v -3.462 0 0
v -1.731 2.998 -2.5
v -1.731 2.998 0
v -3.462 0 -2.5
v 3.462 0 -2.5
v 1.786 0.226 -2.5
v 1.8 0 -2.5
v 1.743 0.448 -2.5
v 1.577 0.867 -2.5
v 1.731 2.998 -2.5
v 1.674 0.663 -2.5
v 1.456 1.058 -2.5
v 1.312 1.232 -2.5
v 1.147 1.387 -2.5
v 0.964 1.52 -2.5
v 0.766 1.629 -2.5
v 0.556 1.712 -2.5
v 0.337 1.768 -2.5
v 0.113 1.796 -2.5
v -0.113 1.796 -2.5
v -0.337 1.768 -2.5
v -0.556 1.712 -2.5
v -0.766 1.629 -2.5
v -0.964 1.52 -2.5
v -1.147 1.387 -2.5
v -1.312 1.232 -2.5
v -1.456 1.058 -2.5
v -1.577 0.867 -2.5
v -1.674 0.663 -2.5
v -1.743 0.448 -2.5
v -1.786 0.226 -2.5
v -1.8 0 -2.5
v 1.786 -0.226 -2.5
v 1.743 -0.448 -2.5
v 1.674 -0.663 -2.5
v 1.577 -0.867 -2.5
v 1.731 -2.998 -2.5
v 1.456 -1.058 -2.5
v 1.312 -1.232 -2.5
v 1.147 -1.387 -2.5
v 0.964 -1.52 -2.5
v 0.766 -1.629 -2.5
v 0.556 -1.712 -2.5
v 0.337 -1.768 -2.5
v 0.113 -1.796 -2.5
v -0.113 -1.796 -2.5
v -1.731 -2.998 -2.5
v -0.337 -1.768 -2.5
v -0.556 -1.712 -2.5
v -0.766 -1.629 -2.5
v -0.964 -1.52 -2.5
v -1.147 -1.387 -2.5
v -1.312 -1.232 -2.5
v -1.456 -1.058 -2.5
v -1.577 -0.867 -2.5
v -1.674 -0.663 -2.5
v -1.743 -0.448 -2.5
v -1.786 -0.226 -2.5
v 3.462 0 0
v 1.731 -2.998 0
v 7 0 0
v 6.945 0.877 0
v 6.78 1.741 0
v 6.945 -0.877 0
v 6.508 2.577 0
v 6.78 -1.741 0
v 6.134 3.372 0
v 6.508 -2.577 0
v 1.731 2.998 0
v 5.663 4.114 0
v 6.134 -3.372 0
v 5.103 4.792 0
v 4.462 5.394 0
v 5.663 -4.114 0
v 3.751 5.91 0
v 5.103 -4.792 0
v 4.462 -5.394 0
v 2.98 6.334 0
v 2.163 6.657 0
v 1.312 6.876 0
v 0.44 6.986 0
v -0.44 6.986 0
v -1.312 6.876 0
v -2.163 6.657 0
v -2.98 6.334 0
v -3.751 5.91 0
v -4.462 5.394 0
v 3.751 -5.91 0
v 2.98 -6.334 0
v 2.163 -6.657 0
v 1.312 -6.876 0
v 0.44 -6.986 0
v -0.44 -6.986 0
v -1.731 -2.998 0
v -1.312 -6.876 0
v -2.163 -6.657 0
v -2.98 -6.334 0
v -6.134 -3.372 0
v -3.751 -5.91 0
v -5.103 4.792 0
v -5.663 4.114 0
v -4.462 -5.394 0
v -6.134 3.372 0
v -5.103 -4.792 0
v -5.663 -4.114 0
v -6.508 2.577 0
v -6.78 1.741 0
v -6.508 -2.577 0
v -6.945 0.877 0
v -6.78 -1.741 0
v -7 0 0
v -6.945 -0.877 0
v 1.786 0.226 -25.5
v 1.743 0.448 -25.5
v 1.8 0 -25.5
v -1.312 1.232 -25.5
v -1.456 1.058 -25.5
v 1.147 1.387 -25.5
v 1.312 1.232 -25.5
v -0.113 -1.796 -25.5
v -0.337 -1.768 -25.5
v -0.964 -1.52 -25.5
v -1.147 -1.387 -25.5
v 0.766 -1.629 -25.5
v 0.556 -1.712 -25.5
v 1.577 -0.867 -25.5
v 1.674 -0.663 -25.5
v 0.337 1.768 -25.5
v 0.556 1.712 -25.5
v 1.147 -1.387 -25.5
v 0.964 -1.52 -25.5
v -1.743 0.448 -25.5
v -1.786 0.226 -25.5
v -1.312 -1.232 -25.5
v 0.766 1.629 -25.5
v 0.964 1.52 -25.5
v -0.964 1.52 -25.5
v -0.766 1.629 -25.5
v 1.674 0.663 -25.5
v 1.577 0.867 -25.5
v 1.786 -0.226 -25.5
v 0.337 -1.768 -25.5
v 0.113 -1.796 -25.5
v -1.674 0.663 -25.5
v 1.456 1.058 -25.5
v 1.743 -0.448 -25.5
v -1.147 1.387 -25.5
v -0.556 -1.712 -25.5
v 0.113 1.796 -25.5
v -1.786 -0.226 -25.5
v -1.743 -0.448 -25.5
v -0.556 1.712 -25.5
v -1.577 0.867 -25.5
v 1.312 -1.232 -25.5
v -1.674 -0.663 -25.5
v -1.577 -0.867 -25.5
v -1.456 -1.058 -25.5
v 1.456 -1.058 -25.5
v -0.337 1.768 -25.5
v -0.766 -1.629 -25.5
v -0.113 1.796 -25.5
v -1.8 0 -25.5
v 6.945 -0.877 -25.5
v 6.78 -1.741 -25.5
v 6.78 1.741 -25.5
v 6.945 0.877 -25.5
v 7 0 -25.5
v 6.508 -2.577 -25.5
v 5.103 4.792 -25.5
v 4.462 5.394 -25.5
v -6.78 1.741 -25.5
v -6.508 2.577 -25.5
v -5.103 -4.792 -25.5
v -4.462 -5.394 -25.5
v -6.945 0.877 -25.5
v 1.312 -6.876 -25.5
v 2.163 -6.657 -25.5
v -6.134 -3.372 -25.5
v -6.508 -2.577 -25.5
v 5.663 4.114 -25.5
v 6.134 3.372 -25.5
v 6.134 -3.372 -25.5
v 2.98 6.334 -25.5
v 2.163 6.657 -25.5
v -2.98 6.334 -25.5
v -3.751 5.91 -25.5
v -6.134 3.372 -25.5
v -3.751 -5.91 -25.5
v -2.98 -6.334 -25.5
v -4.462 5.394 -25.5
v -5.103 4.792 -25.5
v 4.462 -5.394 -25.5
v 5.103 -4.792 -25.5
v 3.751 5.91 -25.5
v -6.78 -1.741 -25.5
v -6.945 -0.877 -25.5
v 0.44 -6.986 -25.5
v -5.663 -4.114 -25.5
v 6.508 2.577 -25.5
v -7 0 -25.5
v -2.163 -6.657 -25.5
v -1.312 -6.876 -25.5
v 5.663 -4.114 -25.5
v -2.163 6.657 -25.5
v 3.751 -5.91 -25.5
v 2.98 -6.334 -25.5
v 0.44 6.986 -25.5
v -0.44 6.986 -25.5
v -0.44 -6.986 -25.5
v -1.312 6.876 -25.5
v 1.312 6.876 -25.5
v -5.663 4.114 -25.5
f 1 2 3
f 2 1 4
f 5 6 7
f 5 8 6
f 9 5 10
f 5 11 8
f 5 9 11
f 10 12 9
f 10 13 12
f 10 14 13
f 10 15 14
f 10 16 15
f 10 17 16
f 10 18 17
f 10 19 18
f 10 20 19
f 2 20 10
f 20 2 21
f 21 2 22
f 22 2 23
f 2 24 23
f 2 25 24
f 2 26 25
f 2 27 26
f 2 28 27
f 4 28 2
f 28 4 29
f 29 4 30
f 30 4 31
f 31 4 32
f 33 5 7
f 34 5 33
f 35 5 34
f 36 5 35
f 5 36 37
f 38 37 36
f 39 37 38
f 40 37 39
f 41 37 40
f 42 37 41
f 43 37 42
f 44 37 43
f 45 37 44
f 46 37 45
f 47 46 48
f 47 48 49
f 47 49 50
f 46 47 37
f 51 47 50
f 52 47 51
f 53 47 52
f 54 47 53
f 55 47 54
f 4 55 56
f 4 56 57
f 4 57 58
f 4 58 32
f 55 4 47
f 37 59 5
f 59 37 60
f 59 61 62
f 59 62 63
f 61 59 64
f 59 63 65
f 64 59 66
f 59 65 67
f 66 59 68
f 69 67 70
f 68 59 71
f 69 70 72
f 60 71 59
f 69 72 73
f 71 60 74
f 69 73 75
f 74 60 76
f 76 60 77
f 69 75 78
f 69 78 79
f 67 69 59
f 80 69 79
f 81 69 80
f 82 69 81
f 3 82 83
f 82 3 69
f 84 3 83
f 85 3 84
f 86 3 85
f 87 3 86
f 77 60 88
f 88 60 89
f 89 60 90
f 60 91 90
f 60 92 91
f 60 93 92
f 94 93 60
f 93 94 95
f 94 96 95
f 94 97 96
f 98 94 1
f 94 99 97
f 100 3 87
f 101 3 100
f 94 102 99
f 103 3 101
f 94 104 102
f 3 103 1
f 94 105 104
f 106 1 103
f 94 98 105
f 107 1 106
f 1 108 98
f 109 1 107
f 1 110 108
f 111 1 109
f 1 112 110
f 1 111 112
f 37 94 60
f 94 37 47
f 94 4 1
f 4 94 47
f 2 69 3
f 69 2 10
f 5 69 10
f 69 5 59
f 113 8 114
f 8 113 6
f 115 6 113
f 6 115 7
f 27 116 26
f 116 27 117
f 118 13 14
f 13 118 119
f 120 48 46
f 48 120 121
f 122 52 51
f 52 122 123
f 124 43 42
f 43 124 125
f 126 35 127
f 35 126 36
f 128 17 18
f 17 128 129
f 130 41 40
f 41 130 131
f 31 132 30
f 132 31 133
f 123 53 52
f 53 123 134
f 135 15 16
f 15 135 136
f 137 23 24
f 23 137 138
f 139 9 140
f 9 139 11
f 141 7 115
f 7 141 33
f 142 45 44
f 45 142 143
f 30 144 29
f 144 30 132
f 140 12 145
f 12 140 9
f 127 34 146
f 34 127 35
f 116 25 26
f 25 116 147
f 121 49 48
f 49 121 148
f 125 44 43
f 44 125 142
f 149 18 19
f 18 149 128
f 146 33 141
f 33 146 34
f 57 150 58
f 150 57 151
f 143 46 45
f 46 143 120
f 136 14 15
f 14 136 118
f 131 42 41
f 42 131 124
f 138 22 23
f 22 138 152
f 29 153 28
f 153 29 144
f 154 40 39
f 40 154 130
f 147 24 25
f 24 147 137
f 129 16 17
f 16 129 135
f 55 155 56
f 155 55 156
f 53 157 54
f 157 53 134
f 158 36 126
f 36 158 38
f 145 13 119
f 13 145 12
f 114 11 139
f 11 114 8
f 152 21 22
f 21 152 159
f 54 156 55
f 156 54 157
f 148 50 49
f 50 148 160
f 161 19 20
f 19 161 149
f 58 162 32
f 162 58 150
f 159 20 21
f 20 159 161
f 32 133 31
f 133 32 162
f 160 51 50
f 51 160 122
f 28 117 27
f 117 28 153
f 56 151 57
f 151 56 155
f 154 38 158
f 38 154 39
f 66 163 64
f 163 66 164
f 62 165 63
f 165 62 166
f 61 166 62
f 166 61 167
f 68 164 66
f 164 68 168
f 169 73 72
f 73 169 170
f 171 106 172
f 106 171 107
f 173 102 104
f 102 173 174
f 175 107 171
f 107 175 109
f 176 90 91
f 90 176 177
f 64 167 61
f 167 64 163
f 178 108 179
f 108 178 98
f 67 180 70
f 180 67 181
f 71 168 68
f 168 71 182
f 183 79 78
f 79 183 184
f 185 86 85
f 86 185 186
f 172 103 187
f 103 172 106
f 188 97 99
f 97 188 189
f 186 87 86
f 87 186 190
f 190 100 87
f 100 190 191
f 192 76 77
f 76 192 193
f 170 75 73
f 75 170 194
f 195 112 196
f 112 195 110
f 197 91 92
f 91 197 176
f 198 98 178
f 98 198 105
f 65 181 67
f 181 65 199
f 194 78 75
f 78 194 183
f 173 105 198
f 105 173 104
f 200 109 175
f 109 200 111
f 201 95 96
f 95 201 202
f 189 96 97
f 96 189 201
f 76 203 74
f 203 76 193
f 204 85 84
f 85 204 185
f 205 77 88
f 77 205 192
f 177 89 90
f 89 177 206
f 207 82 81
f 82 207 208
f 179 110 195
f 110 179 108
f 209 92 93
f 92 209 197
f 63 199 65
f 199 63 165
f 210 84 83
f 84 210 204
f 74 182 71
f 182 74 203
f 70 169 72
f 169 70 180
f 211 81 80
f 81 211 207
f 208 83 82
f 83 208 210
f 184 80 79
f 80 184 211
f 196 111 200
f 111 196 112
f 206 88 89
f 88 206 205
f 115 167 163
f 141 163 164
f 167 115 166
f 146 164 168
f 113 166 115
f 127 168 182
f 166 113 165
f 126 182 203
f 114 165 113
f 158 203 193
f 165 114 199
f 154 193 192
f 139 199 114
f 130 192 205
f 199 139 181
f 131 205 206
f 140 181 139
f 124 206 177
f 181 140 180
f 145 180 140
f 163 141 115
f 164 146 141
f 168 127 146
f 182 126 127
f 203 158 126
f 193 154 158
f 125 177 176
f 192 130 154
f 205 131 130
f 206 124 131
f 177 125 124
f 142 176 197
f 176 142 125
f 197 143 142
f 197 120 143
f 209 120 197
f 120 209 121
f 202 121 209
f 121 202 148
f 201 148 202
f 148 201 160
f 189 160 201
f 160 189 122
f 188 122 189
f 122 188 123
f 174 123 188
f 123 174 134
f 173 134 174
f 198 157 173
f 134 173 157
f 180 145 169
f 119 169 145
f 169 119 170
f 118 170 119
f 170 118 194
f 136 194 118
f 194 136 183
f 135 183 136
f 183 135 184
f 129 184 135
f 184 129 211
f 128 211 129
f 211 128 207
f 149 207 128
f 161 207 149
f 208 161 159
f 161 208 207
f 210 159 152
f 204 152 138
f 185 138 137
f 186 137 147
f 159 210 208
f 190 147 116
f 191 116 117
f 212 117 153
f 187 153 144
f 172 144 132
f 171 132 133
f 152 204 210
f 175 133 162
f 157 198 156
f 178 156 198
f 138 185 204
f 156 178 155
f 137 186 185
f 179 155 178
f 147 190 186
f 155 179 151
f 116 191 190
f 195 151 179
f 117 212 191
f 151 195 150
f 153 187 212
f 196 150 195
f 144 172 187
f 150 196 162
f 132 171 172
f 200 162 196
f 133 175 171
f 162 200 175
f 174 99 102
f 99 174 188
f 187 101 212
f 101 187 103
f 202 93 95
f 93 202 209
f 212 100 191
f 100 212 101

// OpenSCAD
$fn = 50;

difference() {
	union() {
		translate(v = [0, 0, -25.5]) {
			cylinder(h = 25.5, r = 7.0);
		}
	}
	union() {
		translate(v = [0, 0, 0]) {
			rotate(a = [0, 0, 0]) {
				difference() {
					union() {
						translate(v = [0, 0, -2.5]) {
							linear_extrude(height = 2.5) {
								polygon(points = [[3.4619999999999997, 0.0], [1.7310000000000003, 2.9981799479017264], [-1.7309999999999992, 2.9981799479017264], [-3.4619999999999997, 4.2397272186481365e-16], [-1.7310000000000014, -2.998179947901726], [1.7309999999999977, -2.9981799479017277]]);
							}
						}
					}
					union();
				}
			}
		}
		#translate(v = [0, 0, -100.0]) {
			cylinder(h = 200, r = 1.8);
		}
	}
}
